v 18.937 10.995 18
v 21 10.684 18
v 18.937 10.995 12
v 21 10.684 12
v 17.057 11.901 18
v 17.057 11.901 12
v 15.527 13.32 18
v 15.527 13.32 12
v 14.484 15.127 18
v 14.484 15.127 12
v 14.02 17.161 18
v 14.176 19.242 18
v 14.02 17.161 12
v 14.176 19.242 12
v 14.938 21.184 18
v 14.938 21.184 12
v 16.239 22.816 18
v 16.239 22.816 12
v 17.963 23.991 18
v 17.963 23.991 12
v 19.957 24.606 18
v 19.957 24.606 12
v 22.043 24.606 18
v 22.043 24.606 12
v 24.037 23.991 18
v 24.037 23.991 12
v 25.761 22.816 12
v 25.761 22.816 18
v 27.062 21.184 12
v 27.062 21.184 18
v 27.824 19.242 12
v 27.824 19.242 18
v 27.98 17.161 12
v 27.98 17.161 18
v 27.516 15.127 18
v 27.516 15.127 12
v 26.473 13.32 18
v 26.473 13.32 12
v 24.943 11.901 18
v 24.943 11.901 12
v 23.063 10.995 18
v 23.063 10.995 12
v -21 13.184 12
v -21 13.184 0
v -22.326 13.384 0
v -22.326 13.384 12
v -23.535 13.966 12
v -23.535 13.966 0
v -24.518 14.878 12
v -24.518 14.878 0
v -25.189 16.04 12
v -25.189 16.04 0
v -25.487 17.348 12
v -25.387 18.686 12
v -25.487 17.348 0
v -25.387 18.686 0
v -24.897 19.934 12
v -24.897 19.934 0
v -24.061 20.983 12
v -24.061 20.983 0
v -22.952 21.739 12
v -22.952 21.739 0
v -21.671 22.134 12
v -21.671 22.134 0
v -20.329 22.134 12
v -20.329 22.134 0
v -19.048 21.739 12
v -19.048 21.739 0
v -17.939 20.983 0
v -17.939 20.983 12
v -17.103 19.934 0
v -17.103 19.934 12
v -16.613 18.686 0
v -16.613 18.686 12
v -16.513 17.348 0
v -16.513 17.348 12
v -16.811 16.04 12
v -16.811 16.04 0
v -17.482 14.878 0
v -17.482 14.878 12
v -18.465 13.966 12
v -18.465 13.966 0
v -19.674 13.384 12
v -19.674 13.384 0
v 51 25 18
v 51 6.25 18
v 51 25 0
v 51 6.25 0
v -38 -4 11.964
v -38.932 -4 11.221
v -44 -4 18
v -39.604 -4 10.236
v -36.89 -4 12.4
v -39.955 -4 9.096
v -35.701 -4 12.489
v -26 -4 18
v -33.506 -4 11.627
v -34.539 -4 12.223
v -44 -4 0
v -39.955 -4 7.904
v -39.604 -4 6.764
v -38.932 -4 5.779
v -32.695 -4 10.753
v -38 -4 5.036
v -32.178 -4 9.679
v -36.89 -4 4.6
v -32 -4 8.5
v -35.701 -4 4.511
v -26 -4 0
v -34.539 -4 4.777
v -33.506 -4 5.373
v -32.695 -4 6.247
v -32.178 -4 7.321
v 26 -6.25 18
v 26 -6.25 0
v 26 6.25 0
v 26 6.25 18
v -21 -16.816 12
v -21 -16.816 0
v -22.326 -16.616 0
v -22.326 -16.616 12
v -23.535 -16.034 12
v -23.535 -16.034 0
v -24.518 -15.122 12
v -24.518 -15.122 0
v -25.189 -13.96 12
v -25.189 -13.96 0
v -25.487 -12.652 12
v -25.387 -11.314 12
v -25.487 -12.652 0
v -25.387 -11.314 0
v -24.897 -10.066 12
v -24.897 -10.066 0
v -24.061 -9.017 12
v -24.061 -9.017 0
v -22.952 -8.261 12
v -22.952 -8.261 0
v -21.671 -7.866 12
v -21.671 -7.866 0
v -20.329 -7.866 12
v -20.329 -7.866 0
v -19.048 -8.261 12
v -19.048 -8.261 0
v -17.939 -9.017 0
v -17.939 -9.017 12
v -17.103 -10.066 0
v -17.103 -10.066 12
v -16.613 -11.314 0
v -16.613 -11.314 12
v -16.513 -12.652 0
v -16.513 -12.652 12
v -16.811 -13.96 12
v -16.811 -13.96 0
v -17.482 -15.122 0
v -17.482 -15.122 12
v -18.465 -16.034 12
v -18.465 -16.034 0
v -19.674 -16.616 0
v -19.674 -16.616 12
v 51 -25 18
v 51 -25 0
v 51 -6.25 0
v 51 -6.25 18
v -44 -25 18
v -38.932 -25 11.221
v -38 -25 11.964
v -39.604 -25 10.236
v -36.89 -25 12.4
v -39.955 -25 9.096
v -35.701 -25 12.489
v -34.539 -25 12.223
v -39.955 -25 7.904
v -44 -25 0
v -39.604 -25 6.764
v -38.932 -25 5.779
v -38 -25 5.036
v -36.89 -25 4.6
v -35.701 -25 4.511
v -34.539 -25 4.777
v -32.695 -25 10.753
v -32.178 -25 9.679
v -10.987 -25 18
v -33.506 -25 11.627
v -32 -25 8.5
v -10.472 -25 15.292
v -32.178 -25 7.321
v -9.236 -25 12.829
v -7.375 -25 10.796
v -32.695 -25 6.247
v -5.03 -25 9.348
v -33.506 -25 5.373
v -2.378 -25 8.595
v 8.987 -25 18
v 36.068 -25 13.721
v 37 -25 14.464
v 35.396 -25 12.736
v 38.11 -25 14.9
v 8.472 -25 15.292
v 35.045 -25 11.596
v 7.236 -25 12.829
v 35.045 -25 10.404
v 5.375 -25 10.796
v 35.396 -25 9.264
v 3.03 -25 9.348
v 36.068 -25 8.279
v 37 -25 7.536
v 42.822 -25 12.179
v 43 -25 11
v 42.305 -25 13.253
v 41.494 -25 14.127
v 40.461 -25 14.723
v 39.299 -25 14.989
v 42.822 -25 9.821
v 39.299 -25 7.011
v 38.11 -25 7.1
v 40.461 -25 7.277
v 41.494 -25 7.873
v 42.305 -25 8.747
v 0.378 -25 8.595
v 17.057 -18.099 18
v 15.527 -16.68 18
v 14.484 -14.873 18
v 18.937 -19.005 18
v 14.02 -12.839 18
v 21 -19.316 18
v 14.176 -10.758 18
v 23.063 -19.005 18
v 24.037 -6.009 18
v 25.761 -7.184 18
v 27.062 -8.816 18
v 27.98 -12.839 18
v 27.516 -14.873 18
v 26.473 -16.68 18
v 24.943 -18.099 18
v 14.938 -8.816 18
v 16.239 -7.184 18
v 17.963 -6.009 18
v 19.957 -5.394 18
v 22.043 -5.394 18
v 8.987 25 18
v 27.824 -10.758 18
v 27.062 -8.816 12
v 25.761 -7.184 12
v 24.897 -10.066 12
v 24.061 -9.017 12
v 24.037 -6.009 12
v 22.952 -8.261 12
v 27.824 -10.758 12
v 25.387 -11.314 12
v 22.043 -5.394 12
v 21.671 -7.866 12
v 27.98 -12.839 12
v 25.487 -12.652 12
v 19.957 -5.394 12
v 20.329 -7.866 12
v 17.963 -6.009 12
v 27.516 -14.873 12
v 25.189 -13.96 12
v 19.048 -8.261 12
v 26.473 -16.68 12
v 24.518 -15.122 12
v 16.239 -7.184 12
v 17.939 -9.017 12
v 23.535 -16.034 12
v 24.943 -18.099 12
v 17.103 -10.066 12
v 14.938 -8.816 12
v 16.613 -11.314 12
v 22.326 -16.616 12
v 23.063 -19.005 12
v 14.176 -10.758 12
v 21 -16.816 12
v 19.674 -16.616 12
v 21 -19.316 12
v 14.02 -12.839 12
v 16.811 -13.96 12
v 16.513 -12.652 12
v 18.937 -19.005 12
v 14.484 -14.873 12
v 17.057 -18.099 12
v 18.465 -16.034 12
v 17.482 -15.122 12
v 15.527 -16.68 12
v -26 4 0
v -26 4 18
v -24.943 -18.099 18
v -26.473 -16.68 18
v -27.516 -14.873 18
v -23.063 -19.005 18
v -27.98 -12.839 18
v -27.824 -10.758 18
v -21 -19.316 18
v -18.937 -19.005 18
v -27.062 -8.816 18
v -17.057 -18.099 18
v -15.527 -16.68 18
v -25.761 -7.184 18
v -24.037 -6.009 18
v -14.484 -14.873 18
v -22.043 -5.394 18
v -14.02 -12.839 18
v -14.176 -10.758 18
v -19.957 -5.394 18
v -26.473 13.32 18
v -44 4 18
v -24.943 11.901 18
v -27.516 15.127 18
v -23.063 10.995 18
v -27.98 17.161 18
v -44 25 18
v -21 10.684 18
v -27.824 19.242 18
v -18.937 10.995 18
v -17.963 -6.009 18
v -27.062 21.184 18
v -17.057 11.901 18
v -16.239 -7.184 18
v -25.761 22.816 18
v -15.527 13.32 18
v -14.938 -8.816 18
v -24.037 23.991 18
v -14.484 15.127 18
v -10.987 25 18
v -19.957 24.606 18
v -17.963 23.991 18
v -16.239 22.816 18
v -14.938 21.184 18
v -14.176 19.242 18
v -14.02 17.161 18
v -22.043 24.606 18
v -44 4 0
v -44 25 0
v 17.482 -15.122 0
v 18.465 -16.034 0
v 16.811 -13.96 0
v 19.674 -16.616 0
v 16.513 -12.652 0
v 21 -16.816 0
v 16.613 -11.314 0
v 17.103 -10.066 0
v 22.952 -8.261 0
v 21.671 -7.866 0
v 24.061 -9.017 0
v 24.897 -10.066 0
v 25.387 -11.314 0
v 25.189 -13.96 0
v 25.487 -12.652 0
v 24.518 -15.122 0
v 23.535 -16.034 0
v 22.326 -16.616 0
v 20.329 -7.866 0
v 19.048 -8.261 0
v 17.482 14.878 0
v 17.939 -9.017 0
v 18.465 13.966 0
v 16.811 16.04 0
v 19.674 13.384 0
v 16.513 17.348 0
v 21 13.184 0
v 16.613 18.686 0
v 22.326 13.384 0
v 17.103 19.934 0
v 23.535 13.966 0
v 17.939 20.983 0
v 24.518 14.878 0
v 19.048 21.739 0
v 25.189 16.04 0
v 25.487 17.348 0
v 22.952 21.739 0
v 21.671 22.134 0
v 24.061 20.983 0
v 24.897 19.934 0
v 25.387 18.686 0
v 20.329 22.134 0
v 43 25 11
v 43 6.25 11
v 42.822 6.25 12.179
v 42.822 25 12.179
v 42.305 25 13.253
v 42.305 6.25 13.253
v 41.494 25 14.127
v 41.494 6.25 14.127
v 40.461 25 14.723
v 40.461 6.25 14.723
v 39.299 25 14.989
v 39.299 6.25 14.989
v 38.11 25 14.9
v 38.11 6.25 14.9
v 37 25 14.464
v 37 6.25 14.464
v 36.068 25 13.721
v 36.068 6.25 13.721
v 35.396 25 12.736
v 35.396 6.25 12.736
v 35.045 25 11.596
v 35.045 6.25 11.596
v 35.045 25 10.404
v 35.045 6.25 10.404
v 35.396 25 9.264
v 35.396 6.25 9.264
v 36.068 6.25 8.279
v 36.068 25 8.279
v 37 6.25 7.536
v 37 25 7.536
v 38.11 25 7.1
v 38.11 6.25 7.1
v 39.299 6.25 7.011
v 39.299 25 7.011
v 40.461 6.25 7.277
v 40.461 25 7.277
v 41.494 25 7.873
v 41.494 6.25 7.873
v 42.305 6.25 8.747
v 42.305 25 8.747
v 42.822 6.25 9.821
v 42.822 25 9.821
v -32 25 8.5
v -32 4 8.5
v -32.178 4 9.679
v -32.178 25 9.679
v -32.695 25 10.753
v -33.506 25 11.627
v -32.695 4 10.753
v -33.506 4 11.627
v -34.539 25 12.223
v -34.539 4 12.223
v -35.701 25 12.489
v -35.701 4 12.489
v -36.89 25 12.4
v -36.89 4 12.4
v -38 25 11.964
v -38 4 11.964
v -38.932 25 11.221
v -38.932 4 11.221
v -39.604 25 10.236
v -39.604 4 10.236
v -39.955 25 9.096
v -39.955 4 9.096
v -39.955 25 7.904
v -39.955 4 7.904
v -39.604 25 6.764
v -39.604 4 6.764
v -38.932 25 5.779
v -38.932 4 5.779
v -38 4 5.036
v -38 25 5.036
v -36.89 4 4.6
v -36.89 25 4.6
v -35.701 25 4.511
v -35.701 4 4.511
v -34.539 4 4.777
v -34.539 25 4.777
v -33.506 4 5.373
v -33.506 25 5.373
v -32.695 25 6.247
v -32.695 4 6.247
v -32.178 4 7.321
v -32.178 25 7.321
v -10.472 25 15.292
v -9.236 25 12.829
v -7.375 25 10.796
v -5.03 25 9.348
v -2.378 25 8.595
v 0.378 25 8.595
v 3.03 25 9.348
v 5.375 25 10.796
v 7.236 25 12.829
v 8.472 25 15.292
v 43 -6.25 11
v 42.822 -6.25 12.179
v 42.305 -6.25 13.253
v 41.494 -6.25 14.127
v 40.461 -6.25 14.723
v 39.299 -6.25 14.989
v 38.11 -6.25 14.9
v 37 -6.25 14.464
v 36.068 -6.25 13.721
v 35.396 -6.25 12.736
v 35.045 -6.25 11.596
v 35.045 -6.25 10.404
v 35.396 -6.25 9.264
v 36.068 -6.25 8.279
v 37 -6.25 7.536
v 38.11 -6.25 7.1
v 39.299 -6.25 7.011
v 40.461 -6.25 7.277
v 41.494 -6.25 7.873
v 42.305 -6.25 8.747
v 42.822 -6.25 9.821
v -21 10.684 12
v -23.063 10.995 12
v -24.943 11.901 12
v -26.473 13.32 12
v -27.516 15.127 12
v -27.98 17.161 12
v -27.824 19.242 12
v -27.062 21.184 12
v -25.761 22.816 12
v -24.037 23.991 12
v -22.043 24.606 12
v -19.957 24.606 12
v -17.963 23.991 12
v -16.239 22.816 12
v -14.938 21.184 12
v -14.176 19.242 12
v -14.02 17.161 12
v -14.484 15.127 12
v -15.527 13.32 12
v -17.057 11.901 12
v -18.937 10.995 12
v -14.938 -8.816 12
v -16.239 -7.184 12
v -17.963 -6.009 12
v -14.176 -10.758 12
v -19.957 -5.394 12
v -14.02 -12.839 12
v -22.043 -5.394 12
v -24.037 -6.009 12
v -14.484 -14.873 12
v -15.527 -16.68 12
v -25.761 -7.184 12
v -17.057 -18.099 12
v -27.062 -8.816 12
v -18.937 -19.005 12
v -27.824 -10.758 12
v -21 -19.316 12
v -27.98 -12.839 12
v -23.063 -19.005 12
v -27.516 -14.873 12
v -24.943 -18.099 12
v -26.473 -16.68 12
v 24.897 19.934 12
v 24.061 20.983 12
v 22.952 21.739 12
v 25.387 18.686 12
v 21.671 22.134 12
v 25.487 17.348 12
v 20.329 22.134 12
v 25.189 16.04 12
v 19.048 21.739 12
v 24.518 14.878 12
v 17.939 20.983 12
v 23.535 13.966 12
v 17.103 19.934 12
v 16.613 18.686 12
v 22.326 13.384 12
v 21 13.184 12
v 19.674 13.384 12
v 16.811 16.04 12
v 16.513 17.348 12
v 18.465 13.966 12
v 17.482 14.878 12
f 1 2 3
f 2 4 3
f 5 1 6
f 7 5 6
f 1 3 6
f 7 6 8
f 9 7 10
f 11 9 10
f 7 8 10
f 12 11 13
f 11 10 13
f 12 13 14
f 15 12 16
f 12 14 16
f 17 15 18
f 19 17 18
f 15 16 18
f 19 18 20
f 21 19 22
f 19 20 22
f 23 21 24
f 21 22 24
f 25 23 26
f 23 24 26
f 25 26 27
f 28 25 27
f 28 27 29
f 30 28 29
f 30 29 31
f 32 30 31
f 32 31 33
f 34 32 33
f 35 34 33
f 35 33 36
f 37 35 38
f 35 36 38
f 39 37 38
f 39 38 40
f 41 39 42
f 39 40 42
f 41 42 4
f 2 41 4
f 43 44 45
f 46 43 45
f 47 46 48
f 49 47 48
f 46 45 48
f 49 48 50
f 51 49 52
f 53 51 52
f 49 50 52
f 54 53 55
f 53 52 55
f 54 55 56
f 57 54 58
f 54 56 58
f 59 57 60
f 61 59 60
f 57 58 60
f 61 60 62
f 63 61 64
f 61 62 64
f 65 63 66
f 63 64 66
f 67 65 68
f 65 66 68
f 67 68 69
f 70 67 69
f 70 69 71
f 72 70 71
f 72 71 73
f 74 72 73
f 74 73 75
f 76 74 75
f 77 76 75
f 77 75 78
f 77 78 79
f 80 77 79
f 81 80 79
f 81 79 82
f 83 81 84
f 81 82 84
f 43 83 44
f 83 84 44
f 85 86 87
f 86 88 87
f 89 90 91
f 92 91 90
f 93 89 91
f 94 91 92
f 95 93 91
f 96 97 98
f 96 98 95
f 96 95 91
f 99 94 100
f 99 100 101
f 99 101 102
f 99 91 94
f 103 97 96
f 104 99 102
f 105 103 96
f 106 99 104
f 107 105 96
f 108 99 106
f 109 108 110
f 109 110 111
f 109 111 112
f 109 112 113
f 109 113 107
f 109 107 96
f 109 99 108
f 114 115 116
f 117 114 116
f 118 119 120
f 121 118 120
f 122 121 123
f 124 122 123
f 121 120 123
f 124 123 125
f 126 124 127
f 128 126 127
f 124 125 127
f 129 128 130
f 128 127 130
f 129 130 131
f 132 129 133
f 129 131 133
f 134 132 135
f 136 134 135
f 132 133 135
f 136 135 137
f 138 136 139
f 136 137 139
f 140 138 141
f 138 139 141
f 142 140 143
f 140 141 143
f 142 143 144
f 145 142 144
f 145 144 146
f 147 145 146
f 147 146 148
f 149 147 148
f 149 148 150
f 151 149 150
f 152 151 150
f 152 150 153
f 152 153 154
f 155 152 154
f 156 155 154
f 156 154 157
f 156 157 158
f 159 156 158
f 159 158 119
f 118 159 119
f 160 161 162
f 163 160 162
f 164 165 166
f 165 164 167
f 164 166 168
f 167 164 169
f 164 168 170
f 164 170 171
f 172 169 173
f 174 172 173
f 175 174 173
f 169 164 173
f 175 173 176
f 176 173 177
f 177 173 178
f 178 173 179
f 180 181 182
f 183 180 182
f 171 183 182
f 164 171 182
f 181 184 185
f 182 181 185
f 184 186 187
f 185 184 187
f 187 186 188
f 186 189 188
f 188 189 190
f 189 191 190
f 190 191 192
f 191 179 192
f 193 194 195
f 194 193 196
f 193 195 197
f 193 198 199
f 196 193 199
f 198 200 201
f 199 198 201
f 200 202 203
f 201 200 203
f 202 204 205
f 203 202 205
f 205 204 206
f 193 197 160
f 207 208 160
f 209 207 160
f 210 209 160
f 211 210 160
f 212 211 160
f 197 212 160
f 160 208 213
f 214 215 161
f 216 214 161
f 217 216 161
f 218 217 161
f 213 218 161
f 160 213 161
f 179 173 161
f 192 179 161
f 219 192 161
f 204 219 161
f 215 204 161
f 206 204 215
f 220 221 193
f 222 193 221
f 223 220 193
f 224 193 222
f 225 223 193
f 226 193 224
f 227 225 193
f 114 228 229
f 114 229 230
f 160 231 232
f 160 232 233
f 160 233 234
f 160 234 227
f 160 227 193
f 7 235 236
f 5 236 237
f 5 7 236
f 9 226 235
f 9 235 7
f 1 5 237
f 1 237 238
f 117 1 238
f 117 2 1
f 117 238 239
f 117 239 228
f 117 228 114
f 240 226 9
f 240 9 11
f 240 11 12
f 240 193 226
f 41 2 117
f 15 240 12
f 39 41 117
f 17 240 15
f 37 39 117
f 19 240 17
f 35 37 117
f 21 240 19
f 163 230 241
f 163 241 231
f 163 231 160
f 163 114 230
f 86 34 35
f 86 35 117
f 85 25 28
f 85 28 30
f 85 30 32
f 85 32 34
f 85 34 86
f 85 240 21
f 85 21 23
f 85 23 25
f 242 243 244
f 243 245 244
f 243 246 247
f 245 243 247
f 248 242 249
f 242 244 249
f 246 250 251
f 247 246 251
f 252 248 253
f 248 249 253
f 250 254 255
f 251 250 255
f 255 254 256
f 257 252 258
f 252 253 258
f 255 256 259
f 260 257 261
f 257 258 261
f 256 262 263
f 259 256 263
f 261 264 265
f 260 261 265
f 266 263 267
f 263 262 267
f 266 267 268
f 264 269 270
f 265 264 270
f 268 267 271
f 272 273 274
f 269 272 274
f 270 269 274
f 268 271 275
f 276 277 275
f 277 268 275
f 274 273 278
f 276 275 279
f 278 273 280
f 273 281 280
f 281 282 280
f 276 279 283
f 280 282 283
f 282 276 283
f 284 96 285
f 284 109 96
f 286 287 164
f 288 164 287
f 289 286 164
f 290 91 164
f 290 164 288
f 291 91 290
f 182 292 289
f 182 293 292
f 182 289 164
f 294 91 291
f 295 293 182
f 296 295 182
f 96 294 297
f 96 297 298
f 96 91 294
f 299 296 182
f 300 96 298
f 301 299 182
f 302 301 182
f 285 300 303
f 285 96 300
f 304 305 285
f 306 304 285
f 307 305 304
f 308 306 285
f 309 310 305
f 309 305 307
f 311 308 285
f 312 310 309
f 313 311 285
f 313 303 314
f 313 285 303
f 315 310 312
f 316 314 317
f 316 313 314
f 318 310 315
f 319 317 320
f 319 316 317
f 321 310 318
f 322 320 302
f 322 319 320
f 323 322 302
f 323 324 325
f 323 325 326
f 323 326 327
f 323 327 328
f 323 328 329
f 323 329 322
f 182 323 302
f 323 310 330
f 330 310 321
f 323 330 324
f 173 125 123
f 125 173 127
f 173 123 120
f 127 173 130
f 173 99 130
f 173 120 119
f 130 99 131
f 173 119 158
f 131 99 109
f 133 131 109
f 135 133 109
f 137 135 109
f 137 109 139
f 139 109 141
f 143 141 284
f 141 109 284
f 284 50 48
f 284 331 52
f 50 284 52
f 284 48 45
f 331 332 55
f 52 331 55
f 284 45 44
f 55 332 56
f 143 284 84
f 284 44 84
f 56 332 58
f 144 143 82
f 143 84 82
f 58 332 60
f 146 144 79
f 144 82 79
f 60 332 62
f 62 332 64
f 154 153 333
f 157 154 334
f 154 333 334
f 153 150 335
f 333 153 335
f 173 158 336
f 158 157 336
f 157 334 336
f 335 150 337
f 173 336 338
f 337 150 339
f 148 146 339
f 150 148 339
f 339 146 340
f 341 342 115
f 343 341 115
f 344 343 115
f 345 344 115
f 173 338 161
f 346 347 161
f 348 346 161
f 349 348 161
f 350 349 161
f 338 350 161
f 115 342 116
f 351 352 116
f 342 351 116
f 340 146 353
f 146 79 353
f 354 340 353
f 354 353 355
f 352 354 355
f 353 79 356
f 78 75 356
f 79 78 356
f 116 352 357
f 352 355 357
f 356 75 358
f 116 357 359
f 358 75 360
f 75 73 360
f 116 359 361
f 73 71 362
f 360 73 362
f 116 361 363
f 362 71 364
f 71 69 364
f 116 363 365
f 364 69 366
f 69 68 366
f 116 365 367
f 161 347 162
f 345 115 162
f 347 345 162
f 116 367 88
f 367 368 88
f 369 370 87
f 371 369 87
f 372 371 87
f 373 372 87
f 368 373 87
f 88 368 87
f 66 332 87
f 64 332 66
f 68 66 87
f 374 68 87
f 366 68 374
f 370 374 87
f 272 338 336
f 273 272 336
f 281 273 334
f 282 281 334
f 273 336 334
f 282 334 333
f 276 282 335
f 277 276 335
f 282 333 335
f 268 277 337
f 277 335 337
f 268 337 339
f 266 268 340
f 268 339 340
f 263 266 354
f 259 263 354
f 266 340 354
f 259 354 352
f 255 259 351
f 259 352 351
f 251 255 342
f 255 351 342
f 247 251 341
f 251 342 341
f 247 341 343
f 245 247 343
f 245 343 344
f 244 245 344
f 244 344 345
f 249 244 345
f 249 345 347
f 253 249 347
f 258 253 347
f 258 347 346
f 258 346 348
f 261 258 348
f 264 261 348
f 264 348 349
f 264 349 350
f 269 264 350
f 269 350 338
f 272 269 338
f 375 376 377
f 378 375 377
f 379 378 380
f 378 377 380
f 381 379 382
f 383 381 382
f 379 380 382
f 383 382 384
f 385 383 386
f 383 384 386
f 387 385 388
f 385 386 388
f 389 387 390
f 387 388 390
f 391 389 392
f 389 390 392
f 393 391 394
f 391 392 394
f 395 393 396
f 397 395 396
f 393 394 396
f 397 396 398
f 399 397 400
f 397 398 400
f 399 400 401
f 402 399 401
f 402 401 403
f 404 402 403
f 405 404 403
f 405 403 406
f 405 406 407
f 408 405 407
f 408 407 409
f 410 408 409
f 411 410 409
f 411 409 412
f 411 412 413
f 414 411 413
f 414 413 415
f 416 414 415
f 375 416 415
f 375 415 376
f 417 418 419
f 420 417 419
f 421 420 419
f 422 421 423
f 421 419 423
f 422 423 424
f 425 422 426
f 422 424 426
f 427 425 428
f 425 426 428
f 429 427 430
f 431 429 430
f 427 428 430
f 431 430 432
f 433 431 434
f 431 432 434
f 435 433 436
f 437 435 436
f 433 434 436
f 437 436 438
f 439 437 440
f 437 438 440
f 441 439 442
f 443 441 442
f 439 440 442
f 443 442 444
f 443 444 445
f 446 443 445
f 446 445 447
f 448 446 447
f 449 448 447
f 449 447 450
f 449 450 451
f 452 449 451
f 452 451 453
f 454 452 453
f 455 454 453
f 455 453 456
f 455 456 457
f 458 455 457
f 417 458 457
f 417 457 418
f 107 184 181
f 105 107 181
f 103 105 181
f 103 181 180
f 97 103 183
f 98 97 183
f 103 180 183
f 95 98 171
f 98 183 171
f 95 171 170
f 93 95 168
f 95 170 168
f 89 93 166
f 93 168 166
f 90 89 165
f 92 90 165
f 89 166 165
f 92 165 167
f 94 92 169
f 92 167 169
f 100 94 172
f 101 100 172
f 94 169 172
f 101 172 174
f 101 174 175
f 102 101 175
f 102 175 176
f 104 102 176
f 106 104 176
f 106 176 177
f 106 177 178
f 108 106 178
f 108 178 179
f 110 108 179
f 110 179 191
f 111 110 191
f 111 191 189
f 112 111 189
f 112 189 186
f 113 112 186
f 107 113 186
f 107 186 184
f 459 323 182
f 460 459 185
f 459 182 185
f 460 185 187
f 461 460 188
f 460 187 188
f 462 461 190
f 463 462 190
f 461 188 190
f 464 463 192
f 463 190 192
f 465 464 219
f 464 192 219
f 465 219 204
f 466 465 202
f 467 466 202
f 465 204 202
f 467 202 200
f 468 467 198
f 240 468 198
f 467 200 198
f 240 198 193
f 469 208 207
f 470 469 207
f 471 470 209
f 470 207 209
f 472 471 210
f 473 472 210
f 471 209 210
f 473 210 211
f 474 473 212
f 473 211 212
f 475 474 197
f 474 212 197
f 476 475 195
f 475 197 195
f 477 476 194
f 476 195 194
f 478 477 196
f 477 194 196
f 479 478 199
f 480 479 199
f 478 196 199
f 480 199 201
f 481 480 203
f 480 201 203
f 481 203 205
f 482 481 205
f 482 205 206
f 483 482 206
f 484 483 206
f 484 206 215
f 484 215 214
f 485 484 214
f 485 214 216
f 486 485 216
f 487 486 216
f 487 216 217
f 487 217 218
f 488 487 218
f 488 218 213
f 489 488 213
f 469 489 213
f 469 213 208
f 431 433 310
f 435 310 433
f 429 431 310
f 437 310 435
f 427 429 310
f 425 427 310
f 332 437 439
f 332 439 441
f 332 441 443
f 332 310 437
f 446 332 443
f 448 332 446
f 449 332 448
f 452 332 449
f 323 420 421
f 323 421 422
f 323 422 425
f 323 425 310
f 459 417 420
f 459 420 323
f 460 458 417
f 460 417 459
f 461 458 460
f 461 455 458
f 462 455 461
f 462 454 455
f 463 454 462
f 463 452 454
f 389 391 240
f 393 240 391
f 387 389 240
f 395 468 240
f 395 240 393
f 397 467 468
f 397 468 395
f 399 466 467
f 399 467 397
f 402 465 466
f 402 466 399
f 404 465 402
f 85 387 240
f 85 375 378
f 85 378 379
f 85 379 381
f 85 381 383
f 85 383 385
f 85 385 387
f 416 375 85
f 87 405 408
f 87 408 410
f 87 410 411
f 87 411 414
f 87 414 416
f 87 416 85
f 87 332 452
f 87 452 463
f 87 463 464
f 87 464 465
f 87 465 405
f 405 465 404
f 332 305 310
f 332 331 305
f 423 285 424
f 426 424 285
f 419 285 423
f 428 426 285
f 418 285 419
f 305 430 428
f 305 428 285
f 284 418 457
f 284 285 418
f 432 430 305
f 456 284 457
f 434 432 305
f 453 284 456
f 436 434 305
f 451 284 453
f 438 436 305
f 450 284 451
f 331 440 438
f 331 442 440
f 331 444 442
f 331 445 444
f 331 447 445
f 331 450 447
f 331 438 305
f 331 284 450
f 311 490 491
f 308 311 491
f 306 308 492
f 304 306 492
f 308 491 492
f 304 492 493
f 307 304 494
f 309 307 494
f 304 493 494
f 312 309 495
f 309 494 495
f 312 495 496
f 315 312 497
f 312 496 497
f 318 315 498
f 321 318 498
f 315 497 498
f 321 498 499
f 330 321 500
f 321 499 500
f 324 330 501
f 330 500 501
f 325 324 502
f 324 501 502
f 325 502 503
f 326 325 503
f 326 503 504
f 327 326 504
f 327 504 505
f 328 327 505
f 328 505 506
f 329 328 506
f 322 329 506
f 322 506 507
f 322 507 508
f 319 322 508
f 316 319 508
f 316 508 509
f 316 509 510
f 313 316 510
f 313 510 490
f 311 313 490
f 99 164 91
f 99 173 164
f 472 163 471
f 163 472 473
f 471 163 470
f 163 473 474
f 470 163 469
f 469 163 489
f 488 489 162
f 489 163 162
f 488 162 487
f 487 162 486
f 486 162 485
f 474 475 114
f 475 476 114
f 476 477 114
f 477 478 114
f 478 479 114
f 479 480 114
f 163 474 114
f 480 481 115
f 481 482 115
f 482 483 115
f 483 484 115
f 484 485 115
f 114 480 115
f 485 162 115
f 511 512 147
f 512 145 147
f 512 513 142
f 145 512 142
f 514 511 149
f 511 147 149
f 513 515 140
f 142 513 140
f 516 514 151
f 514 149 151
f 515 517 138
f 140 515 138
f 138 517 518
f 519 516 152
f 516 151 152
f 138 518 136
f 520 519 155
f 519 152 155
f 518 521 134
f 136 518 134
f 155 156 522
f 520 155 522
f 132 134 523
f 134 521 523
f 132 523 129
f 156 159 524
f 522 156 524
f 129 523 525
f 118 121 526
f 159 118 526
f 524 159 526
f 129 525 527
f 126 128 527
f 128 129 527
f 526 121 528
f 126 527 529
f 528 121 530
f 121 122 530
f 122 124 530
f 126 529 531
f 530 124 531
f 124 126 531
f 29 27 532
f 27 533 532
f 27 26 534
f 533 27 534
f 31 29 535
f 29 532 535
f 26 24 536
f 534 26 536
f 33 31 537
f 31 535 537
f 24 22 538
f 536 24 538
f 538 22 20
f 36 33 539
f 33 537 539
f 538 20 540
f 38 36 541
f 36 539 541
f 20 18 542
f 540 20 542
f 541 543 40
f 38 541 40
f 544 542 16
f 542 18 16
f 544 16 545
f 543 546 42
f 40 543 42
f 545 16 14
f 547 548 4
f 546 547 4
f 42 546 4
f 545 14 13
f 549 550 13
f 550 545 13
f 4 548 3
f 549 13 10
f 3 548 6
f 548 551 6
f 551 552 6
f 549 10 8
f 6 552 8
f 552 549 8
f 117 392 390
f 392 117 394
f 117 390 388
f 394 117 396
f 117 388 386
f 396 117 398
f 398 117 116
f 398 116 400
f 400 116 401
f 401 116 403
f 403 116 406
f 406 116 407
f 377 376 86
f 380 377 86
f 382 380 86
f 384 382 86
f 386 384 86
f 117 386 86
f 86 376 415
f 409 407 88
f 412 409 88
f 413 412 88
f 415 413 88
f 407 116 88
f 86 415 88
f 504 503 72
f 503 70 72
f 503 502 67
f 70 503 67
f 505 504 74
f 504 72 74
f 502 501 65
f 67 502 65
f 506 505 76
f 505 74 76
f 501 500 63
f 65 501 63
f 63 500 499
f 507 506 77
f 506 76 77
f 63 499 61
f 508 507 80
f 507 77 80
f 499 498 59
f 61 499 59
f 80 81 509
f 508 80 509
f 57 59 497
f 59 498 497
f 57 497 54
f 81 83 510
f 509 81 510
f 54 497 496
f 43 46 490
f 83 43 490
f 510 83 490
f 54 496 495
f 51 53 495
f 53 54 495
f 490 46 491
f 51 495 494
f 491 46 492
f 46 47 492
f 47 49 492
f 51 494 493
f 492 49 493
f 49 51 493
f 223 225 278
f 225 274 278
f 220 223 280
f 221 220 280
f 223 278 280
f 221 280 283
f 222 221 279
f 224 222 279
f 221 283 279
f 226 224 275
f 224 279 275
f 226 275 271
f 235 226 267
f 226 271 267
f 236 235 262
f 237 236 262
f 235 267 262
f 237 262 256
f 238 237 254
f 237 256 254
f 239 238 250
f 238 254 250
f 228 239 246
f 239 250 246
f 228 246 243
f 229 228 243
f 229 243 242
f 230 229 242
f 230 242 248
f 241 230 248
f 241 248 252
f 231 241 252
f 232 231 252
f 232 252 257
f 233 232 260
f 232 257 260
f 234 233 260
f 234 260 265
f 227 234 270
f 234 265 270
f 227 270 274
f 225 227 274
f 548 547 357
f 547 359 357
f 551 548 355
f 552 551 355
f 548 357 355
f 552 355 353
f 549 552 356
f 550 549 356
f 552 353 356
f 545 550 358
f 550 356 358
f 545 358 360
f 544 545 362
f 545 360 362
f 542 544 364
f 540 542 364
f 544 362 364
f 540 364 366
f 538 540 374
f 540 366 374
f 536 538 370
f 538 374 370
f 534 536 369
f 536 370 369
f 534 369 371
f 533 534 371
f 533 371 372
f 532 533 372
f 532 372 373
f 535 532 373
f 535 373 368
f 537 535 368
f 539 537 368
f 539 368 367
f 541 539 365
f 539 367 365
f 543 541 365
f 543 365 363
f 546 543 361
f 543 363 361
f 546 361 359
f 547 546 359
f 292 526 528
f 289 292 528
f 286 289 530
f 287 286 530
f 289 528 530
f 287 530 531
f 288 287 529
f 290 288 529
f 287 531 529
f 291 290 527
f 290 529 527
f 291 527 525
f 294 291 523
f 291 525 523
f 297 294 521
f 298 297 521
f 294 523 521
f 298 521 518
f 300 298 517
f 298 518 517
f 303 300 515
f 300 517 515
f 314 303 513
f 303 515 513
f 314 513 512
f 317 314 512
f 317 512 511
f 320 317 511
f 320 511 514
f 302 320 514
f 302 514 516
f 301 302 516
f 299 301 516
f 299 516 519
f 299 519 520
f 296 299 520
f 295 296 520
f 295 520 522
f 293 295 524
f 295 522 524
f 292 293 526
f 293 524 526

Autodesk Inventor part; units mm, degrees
ref_plane "YZ Plane" through (0, 0, 0) normal (1, 0, 0) x (0, 1, 0)
ref_plane "XZ Plane" through (0, 0, 0) normal (0, 1, 0) x (-1, 0, 0)
ref_plane "XY Plane" through (0, 0, 0) normal (0, 0, 1) x (1, 0, 0)
sketch "Szkic2" plane through (0, 0, 0) normal (0, 0, 1) x (1, 0, 0)
  line L0 (-44, 25) -> (51, 25)
  line L1 (-44, -25) -> (51, -25)
  line L2 (51, -25) -> (51, -6.25)
  line L3 (51, -6.25) -> (26, -6.25)
  line L4 (26, -6.25) -> (26, 6.25)
  line L5 (26, 6.25) -> (51, 6.25)
  line L6 (51, 6.25) -> (51, 25)
  line L7 (-44, -25) -> (-44, -4)
  line L8 (-44, -4) -> (-26, -4)
  line L9 (-26, -4) -> (-26, 4)
  line L10 (-26, 4) -> (-44, 4)
  line L11 (-44, 4) -> (-44, 25)
  line L12 (0, 35) -> (0, -35) projected
  line L13 (-63, 0) -> (70, 0) projected
  point P0 (0, 0)
  dimension "d7" = 95
  dimension "d8" = 25
  dimension "d9" = 12.5
  dimension "d10" = 18
  dimension "d11" = 50
  dimension "d12" = 8
extrude "Wyciągnięcie proste1" add sketch "Szkic2" along normal blind 18
sketch "Szkic3" plane through (-44, -25, 0) normal (0, -1, 0) x (1, 0, 0)
  line L0 (0, 0) -> (95, 0) projected
  line L1 (95, 0) -> (95, 18) projected
  line L2 (0, 18) -> (95, 18) projected
  line L3 (0, 0) -> (0, 18) projected
  circle A0 centre (8, 8.5) radius 4
  circle A1 centre (83, 11) radius 4
  circle A2 centre (43, 18.5) radius 10
  point P0 (44, 0)
  dimension "d16" = 11
  dimension "d19" = 9.5
  dimension "d21" = 20
  dimension "d22" = 43
  dimension "d23" = 40
  dimension "d24" = 35
  dimension "d25" = 8
  dimension "d26" = 0.5
  dimension "d27" = 8
extrude "Wyciągnięcie proste2" cut sketch "Szkic3" against normal through all contours A2 L2 | L2 A2 | A0 | A1
sketch "Szkic4" plane through (0, 0, 18) normal (0, 0, 1) x (1, 0, 0)
  line L0 (0, 35) -> (0, -35) projected
  line L1 (-63, 0) -> (70, 0) projected
  point P0 (0, 0)
  point P1 (21, -12.3158)
  point P2 (21, 17.6842)
  point P3 (-21, 17.6842)
  point P4 (-21, -12.3158)
  dimension "d30" = 42
  dimension "d31" = 30
hole "Otwór1" at (21, -12.3158, 18) at (21, 17.6842, 18) at (-21, 17.6842, 18) at (-21, -12.3158, 18) direction (0, 0, -1) diameter 9 depth 20 tip angle 118 counterbore diameter 14 counterbore depth 6
properties part number "Podstawa"
